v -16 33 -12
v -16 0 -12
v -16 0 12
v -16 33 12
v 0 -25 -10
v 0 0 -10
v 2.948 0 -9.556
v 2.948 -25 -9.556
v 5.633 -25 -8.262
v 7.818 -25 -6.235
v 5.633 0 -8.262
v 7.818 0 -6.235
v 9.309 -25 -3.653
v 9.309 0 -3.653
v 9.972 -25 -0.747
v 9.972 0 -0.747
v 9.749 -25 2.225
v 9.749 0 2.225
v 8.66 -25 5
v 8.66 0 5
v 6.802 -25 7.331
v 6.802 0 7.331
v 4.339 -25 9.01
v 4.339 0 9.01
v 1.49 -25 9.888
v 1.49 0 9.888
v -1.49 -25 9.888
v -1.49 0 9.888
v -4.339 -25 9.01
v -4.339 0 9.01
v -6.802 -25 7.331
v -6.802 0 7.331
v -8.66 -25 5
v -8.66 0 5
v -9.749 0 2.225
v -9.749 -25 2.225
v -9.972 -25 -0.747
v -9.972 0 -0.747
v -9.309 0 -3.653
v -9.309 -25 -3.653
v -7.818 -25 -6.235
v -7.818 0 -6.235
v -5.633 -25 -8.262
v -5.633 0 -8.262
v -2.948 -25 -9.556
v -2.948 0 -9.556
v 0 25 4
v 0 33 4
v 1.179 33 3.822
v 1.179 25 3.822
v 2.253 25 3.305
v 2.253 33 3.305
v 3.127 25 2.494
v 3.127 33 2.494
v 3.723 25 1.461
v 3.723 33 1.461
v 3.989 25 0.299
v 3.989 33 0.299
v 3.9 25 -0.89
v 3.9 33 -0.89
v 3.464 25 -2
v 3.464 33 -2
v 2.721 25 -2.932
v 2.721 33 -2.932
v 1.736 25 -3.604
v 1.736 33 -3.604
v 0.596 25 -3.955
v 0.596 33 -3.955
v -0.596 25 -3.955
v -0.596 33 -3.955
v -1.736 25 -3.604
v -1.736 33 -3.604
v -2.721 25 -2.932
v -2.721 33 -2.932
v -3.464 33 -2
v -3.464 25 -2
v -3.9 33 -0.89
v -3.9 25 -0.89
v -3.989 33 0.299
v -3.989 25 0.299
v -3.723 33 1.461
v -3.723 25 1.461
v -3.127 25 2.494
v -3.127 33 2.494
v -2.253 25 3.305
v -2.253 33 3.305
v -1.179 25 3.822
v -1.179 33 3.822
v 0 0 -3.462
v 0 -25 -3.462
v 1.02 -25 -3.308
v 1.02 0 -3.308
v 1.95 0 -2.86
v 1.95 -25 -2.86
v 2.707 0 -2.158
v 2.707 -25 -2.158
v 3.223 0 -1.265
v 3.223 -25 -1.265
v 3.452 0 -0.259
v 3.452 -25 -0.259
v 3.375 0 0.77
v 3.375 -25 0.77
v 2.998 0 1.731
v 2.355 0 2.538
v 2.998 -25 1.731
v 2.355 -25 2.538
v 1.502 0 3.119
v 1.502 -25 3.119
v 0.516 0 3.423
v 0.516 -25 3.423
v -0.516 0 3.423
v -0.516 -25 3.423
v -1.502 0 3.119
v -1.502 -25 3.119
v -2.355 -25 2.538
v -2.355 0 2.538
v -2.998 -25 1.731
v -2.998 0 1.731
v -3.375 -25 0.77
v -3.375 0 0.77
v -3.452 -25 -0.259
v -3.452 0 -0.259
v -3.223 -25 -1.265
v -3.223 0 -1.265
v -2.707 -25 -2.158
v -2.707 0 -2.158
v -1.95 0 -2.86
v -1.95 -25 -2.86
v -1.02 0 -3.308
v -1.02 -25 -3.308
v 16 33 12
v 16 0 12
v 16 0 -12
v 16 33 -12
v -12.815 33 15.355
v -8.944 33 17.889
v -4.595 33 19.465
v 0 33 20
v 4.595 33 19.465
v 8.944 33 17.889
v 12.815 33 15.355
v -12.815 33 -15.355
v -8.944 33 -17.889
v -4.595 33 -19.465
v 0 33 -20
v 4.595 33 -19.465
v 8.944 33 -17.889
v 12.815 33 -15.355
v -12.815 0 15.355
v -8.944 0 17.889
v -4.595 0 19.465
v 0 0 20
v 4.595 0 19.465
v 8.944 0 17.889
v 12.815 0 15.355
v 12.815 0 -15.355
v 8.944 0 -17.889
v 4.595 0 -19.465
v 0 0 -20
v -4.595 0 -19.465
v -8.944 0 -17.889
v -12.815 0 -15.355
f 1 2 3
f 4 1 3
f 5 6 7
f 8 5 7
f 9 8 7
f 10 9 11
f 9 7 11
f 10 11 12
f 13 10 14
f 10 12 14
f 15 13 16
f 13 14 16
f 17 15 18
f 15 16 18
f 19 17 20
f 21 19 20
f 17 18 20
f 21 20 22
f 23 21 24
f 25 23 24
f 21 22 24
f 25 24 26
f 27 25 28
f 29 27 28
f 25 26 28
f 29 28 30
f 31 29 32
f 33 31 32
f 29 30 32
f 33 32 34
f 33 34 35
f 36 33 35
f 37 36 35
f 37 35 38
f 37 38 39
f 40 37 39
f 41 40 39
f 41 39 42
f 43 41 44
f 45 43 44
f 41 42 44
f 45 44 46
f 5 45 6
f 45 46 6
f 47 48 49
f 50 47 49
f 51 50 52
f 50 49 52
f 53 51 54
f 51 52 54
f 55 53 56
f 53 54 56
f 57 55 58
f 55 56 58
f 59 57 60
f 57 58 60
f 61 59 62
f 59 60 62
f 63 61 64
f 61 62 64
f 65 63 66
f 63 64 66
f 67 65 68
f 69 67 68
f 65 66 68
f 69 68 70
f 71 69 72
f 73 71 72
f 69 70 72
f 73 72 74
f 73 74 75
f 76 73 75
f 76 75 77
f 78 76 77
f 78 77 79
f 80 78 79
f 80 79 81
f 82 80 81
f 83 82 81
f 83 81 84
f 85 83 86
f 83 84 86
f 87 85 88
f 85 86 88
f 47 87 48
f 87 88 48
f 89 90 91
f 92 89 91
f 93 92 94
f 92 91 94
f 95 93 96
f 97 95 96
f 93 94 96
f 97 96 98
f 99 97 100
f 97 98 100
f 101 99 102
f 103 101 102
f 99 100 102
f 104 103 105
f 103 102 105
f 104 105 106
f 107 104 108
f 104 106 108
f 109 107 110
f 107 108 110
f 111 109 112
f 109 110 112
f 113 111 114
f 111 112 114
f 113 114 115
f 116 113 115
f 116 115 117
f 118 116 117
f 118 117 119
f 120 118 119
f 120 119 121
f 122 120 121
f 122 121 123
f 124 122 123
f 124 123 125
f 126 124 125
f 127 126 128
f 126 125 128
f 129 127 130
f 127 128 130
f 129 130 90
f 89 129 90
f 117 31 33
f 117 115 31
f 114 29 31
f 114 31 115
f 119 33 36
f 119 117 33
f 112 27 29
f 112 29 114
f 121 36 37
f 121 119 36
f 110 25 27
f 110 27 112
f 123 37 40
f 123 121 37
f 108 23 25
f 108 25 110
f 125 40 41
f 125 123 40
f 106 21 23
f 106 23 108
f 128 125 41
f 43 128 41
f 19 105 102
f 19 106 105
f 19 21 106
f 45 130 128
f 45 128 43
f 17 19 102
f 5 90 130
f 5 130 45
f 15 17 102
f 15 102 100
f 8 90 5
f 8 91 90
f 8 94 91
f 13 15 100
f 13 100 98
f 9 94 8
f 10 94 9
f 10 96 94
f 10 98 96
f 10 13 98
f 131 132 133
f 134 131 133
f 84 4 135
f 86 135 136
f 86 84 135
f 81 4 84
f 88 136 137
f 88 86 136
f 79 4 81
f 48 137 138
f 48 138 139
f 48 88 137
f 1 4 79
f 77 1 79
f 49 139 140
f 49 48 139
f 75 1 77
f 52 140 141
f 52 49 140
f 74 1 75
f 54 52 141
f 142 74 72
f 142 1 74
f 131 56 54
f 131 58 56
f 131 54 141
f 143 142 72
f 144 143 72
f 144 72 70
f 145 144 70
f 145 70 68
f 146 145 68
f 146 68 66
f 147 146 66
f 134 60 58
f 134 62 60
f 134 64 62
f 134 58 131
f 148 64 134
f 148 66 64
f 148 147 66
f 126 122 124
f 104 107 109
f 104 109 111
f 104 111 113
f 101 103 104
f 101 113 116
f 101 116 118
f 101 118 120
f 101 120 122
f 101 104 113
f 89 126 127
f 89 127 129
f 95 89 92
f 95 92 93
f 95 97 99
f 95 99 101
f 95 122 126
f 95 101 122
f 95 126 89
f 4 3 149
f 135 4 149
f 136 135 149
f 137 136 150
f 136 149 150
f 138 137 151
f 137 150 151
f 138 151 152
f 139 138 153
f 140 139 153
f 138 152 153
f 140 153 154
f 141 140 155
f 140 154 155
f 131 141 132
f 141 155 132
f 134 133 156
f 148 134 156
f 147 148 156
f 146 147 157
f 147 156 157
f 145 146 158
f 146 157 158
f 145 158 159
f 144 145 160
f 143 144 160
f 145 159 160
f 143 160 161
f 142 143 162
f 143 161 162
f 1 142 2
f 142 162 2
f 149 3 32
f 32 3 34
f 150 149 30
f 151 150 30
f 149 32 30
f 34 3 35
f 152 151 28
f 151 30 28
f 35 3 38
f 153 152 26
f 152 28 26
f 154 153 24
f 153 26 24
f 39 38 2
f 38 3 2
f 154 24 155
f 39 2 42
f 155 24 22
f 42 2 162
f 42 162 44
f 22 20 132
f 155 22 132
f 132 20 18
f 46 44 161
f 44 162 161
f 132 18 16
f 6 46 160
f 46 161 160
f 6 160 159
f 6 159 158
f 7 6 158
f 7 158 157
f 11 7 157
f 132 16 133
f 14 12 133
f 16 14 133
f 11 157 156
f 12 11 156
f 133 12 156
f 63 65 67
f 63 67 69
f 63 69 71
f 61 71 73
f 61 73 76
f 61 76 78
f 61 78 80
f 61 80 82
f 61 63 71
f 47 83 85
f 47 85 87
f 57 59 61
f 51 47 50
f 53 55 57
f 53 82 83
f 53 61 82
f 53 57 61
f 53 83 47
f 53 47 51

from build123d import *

# Parameters (mm, degrees)
EXTRUDE_1_DEPTH     = 33
SKETCH_2_R          = 10
EXTRUDE_2_DEPTH     = 25
SKETCH_3_R          = 4
CUT_EXTRUDE_1_DEPTH = 8
SKETCH_4_R          = 3.46188381
CUT_EXTRUDE_2_DEPTH = 25


with BuildPart() as part:
    # 草图1 → 凸台-拉伸1 (new body)
    with BuildSketch(Plane(origin=(0, 0, 0), x_dir=(1, 0, 0), z_dir=(0, 1, 0))):
        with BuildLine():
            Line((-16, 12), (-16, -12))
            ThreePointArc((-16, -12), (0, -20), (16, -12))
            Line((16, -12), (16, 12))
            ThreePointArc((16, 12), (0, 20), (-16, 12))
        make_face()
    extrude(amount=EXTRUDE_1_DEPTH)

    # 草图2 → 凸台-拉伸2 (add)
    with BuildSketch(Plane.XZ):
        with Locations(Location((0, 0, 0), (0, 0, 270))):
            Circle(SKETCH_2_R)
    extrude(amount=EXTRUDE_2_DEPTH)

    # 草图3 → 切除-拉伸1 (cut)
    with BuildSketch(Plane(origin=(0, 33, 0), x_dir=(1, 0, 0), z_dir=(0, 1, 0))):
        with Locations(Location((0, 0, 0), (0, 0, 270))):
            Circle(SKETCH_3_R)
    extrude(amount=-CUT_EXTRUDE_1_DEPTH, mode=Mode.SUBTRACT)

    # 草图4 → 切除-拉伸2 (cut)
    with BuildSketch(Plane.XZ.offset(25)):
        with Locations(Location((0, 0, 0), (0, 0, 270))):
            Circle(SKETCH_4_R)
    extrude(amount=-CUT_EXTRUDE_2_DEPTH, mode=Mode.SUBTRACT)


solid = part.part
